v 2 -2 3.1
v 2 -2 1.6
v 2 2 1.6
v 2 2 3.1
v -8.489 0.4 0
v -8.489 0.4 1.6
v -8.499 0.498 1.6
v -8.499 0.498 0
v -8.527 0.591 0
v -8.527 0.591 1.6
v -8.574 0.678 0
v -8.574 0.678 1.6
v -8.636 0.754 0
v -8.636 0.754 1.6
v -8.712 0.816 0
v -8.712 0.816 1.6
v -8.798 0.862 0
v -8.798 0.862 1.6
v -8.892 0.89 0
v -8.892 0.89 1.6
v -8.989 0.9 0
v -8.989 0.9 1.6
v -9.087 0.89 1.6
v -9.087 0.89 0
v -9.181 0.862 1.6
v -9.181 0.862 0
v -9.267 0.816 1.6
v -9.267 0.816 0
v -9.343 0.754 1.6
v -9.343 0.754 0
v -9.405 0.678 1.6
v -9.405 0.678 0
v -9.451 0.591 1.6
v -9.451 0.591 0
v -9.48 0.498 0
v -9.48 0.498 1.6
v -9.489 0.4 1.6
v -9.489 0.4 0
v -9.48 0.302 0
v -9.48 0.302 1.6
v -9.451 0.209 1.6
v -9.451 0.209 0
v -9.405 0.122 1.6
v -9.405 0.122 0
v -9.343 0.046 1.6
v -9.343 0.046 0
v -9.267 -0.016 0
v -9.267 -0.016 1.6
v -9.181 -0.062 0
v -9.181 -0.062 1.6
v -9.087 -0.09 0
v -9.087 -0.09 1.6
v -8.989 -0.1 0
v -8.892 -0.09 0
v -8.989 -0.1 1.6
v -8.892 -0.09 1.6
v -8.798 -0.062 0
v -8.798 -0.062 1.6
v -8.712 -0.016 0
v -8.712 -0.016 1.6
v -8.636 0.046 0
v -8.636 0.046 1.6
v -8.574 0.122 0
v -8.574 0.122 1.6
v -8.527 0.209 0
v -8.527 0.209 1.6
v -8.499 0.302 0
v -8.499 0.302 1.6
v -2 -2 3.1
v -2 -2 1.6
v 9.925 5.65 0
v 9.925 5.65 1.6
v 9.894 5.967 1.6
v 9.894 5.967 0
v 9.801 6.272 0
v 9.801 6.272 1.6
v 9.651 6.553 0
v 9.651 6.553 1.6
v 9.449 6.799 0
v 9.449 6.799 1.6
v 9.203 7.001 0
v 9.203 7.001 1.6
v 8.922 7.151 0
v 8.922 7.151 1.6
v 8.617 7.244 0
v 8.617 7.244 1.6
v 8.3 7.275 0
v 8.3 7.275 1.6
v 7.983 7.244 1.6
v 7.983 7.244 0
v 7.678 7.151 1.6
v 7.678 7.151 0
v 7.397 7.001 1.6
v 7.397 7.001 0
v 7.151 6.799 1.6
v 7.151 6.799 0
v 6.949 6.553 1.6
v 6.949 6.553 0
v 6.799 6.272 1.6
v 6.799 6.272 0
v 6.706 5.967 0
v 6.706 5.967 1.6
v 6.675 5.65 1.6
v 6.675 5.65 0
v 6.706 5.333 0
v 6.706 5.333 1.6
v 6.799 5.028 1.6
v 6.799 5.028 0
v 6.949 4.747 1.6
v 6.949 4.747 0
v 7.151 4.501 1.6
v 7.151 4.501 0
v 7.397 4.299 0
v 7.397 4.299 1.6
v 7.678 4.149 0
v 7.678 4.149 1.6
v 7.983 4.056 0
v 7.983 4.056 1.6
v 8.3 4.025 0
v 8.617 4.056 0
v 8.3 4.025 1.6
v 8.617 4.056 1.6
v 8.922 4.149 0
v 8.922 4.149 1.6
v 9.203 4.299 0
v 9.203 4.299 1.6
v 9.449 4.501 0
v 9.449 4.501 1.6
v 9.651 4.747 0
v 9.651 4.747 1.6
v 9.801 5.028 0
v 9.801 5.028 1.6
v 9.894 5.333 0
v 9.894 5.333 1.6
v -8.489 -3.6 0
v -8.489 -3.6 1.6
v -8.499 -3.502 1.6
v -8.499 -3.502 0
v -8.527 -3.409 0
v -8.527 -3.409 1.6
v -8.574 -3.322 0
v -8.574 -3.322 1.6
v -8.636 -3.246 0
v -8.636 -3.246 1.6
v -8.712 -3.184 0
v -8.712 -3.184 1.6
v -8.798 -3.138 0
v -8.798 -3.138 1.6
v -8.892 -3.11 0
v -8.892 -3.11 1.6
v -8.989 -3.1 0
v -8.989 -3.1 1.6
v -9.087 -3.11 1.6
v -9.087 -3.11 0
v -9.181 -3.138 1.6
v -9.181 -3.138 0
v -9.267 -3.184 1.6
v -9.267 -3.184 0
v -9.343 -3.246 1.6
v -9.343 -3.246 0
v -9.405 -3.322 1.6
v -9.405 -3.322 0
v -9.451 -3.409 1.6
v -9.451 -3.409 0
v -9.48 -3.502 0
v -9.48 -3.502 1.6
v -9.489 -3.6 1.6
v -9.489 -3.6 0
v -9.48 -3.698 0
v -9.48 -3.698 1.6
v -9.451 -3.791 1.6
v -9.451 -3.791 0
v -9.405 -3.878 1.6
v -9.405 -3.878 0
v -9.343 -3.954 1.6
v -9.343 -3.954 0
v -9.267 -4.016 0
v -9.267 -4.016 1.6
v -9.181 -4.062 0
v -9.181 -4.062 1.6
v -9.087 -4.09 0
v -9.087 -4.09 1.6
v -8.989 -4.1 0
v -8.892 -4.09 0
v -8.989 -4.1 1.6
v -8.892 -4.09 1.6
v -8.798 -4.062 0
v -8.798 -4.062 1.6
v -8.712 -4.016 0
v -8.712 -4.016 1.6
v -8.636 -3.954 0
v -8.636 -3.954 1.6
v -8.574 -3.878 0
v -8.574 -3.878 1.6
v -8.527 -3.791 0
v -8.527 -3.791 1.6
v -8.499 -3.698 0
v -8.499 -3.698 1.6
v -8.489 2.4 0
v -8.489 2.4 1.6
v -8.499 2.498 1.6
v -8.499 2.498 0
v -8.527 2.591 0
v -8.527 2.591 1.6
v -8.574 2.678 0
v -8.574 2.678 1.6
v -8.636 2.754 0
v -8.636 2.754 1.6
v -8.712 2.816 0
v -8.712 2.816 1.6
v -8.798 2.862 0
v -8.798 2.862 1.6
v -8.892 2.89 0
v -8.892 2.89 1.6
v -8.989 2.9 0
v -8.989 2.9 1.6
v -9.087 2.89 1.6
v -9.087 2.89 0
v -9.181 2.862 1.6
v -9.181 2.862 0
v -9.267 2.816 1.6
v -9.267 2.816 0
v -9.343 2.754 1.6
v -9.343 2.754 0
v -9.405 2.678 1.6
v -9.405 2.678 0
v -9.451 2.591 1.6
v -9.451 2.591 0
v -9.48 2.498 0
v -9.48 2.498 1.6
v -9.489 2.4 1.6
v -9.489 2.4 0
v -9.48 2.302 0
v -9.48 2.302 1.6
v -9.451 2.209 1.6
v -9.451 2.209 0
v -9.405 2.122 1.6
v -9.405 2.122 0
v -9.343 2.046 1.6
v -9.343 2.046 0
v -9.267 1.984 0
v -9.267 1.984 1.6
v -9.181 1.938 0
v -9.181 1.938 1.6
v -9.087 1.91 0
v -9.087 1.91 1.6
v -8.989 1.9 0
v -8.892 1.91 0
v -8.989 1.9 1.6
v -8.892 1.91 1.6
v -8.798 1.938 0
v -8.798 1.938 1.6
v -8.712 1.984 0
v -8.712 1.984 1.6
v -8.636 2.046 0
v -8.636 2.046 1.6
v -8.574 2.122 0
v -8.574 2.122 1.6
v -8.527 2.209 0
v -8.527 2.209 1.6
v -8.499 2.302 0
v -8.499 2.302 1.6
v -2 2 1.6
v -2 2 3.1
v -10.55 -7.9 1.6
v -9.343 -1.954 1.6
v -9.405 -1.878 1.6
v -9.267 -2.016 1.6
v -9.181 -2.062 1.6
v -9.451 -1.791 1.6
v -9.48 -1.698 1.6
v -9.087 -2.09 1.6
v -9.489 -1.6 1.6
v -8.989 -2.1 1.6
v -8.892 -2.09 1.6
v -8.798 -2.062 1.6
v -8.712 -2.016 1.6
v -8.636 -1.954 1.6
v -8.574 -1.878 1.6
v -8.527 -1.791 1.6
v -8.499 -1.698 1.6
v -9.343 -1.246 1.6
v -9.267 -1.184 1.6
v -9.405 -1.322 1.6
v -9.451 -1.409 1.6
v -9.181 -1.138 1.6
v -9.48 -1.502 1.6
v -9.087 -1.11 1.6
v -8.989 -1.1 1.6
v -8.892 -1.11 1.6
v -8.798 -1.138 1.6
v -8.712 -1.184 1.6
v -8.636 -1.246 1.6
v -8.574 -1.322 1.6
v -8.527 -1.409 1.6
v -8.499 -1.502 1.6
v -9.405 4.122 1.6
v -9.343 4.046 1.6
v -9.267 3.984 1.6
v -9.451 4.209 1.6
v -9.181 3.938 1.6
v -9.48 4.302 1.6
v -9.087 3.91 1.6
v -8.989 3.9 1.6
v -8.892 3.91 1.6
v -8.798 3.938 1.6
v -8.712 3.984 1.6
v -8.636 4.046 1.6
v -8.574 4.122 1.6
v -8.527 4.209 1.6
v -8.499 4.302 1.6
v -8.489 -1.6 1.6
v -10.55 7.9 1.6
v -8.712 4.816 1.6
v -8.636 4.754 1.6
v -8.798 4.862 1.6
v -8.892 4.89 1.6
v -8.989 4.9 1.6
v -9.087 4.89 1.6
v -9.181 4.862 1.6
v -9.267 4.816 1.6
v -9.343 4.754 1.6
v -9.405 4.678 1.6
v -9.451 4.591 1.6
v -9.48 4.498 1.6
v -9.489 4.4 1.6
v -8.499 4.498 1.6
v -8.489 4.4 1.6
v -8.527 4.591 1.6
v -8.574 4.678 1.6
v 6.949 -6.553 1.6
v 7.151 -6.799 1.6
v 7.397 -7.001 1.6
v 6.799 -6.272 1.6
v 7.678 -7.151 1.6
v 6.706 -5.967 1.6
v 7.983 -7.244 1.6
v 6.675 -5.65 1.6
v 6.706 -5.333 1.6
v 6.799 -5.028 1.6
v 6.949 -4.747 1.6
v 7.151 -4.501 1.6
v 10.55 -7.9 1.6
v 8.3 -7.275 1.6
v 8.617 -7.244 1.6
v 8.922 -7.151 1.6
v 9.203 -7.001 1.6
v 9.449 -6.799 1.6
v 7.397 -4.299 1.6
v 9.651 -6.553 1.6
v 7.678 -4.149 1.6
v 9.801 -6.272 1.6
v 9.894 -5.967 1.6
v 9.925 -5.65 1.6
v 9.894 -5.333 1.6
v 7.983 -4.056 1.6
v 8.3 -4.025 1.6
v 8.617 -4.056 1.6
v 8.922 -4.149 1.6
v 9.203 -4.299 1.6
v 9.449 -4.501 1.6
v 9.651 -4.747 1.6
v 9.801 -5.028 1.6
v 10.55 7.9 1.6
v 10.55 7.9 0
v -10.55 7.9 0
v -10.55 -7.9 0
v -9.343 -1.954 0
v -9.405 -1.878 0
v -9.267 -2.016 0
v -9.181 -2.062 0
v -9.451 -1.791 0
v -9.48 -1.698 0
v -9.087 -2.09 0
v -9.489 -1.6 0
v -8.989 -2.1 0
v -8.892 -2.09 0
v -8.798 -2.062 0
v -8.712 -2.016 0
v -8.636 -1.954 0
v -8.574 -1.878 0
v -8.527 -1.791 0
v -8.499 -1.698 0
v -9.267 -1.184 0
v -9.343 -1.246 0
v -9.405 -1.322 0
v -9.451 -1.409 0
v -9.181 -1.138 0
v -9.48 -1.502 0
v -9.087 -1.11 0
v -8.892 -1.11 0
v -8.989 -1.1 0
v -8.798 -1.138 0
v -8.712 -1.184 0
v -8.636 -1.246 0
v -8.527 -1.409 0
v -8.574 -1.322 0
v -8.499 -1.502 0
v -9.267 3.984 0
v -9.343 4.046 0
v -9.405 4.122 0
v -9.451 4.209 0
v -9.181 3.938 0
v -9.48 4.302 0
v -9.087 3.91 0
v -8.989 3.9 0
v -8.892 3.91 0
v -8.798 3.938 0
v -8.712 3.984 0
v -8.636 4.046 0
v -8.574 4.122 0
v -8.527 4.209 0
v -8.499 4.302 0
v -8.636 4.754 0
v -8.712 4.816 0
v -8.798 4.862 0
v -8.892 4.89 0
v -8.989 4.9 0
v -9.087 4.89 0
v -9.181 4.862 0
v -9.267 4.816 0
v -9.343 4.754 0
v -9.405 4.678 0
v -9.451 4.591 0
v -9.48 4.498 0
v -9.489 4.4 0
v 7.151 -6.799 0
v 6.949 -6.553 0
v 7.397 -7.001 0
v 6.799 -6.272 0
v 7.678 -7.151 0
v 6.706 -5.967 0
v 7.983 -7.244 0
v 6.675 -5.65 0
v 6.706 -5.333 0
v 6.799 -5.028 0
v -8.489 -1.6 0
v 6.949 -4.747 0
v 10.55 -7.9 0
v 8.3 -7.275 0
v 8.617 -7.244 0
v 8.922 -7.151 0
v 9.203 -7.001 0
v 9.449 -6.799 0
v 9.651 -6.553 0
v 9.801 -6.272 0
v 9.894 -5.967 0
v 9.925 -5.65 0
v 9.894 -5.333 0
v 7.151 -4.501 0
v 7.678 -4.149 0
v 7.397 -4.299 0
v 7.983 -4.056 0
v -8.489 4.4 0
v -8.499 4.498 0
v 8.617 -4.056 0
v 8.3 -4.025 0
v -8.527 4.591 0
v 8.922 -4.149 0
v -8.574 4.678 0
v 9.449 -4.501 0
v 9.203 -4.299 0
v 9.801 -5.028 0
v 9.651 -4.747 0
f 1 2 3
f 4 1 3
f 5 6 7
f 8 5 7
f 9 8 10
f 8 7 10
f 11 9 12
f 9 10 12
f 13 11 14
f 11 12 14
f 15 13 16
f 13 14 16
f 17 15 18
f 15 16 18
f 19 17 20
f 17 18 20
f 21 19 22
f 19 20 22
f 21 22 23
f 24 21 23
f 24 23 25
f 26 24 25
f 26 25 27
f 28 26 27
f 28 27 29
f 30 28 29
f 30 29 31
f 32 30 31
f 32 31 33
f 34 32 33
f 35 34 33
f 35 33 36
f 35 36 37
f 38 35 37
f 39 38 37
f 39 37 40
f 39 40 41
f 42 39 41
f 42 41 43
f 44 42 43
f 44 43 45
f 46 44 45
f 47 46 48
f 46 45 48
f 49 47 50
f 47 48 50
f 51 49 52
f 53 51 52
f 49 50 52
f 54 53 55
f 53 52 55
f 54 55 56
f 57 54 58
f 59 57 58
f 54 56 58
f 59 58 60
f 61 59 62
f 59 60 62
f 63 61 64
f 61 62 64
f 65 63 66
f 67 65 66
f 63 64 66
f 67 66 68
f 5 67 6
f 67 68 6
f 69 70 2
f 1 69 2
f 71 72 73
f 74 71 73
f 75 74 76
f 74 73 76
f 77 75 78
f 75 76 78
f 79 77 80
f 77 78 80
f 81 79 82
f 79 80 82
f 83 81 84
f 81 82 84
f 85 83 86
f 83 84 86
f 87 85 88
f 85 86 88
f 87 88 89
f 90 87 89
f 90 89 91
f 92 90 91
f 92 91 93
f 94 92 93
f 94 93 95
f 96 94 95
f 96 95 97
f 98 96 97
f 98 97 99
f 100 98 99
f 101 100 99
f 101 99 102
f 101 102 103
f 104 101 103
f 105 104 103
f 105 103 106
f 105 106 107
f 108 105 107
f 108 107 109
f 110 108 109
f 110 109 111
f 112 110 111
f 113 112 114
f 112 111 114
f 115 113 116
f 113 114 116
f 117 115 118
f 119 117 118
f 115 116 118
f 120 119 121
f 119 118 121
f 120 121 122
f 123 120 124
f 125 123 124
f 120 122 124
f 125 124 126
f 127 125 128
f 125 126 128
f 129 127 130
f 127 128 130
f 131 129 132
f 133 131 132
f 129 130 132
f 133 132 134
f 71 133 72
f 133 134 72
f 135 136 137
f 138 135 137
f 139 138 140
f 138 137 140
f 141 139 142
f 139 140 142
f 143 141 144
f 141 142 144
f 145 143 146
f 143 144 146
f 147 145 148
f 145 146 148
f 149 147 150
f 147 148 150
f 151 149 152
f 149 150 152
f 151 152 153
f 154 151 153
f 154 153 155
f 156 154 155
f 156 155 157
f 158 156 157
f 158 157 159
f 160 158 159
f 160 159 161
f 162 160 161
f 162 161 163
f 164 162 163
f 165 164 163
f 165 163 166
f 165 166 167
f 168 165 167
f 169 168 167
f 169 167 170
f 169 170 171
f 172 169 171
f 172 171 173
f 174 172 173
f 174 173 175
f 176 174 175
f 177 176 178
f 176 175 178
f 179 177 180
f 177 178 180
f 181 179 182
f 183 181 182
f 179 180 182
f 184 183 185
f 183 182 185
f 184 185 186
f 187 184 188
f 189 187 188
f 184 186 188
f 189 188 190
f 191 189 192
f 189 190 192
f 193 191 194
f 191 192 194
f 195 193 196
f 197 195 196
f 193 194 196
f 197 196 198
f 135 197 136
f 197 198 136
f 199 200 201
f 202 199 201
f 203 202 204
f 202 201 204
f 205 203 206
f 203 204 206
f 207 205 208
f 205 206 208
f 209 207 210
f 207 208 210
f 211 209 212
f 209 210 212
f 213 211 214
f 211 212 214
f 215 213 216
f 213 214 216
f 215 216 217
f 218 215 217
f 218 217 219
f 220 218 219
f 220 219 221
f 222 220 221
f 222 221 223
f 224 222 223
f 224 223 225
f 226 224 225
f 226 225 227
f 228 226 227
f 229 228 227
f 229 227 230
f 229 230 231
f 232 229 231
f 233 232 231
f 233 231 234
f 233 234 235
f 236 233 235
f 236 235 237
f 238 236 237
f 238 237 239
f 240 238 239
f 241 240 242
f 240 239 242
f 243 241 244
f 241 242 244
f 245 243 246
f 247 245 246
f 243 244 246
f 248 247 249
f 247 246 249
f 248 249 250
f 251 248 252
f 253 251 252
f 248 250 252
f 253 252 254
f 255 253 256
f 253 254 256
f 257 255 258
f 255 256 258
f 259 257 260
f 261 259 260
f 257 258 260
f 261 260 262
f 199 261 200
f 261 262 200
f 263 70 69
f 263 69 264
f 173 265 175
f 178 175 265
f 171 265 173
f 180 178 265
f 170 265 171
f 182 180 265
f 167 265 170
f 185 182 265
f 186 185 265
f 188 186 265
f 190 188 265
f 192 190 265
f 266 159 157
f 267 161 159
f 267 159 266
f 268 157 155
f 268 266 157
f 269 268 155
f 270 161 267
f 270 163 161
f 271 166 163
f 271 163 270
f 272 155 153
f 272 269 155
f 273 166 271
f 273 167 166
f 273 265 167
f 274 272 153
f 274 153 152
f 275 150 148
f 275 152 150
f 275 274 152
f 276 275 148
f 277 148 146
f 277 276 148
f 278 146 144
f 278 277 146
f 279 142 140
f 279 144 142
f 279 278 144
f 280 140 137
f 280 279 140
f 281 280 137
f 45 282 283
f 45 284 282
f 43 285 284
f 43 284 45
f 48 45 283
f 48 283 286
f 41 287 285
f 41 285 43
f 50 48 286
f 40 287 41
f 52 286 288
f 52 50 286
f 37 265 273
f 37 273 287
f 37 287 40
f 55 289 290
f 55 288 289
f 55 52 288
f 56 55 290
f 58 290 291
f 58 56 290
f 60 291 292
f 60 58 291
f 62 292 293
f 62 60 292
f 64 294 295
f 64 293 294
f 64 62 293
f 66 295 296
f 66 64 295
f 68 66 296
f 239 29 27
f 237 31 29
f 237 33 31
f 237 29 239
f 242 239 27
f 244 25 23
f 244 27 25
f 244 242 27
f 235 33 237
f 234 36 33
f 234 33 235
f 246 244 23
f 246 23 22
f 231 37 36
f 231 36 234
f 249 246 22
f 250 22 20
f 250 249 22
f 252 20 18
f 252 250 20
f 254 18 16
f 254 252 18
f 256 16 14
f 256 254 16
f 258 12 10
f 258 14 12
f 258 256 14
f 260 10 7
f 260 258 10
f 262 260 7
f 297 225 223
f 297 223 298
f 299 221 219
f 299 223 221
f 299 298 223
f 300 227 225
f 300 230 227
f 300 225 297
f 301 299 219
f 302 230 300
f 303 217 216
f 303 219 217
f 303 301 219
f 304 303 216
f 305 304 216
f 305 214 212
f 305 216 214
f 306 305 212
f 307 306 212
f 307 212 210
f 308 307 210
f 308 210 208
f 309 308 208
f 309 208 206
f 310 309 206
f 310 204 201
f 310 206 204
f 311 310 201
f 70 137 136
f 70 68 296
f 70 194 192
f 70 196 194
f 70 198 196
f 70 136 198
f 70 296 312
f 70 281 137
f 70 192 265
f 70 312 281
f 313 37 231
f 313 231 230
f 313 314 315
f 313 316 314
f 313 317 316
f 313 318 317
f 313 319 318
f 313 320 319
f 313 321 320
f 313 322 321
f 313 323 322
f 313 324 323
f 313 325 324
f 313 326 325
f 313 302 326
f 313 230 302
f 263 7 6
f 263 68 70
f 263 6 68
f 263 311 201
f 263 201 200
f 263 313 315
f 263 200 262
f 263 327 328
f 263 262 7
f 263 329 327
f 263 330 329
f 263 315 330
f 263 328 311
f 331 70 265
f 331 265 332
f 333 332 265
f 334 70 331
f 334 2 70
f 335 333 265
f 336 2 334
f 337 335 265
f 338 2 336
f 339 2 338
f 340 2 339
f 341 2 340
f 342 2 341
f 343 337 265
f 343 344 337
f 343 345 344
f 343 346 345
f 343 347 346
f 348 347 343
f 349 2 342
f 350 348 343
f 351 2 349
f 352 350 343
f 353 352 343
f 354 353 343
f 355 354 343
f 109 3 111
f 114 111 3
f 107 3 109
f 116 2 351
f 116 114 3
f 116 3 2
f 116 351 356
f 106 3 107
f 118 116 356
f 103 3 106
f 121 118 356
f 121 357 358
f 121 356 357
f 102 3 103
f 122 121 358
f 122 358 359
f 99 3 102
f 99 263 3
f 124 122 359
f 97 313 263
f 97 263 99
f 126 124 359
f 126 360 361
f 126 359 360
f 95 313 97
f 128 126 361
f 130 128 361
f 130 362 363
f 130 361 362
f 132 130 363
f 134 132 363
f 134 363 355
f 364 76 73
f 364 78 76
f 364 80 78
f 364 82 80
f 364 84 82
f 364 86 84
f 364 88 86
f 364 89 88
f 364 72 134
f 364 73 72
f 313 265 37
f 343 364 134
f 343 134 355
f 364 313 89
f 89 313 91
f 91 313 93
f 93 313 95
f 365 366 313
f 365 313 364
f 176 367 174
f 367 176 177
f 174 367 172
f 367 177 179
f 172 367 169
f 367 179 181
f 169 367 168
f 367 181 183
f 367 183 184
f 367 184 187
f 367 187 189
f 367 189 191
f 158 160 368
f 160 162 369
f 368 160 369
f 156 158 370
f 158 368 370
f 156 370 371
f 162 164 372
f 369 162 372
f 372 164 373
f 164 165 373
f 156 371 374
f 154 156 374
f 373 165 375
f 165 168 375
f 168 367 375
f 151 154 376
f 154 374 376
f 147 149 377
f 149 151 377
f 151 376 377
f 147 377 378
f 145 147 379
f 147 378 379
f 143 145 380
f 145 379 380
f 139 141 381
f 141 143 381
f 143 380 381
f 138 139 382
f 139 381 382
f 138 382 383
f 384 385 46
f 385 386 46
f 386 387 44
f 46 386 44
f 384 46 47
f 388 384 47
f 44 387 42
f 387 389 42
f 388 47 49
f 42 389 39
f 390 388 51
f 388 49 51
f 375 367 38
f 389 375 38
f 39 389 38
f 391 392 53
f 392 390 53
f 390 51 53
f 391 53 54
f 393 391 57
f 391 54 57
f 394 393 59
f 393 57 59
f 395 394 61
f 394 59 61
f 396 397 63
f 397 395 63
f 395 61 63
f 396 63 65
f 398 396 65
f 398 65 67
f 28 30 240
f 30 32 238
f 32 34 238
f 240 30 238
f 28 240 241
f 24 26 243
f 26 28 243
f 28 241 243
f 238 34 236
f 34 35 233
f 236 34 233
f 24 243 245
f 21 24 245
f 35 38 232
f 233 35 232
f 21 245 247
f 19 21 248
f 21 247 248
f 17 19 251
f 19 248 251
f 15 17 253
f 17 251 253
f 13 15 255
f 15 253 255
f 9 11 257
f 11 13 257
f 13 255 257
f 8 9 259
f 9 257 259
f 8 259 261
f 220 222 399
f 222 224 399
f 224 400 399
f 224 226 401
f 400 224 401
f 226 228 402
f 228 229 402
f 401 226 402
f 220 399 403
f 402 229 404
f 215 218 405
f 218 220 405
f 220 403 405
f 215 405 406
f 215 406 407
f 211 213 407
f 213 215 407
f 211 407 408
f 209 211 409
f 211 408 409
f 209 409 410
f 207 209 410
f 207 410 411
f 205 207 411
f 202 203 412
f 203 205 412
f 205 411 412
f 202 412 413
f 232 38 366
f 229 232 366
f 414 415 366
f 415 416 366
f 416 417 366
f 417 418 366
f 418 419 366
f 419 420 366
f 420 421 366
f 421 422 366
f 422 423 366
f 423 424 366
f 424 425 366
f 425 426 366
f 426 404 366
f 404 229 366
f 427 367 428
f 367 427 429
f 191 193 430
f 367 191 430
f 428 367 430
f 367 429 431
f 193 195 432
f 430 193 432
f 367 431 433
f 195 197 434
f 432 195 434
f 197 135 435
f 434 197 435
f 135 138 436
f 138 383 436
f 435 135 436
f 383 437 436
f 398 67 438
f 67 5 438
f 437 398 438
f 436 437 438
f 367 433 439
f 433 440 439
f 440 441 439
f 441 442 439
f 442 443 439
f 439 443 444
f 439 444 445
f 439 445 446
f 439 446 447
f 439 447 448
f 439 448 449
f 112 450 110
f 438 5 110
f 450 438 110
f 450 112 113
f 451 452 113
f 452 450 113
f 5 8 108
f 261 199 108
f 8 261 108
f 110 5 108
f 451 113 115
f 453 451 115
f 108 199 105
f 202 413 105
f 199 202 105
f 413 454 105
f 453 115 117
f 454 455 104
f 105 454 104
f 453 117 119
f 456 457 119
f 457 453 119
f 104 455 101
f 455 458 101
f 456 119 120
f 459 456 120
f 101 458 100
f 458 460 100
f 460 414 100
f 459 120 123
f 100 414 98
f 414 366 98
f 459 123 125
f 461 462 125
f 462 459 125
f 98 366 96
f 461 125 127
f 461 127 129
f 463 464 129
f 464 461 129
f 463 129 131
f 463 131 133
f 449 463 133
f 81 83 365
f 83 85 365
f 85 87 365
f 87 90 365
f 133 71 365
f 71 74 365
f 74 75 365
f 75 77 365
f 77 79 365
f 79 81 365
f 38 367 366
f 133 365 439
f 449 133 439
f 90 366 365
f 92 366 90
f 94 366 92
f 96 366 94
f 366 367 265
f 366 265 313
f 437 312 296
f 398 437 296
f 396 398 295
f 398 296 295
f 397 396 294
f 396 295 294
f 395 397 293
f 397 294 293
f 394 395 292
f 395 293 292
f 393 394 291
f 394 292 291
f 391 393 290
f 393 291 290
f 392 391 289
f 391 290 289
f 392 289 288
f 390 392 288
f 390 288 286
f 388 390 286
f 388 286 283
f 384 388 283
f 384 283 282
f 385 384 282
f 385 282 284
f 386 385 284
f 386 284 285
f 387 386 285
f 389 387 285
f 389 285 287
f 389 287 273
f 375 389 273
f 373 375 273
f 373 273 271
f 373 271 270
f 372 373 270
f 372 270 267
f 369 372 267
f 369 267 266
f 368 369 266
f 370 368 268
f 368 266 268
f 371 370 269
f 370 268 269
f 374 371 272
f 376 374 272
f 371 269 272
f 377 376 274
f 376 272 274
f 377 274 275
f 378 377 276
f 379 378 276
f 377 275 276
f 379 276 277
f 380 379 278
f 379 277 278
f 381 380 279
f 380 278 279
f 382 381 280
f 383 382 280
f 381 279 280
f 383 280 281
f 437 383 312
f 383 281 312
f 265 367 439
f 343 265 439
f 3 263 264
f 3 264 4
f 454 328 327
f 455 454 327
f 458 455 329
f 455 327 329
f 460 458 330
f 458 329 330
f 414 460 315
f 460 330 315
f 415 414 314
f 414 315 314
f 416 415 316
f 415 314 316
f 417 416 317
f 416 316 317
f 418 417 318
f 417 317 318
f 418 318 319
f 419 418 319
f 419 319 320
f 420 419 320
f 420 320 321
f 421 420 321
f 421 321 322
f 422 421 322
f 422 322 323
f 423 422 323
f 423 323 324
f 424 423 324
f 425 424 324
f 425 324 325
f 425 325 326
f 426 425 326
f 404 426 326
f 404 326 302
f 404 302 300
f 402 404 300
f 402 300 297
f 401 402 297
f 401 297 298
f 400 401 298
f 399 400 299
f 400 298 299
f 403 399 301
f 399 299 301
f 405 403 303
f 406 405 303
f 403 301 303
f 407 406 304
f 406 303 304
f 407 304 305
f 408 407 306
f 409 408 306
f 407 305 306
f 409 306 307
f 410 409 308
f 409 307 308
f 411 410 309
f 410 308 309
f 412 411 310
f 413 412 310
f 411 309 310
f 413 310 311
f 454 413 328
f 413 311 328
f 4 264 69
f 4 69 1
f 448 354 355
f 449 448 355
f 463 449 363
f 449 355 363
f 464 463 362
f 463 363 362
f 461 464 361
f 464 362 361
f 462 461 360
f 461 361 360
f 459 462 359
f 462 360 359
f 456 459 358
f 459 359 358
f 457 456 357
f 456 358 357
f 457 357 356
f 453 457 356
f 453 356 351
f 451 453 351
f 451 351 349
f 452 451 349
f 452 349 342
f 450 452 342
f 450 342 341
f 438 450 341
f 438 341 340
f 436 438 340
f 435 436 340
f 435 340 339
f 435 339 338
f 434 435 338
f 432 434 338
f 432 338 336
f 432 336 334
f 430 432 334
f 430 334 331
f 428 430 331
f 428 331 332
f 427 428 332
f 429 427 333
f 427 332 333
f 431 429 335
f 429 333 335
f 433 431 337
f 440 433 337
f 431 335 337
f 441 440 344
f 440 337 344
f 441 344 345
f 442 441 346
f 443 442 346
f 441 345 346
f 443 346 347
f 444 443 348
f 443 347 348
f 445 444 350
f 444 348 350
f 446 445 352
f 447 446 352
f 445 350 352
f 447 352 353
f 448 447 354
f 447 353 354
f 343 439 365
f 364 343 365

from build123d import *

# Parameters (mm, degrees)
F0_W     = 21.1
F0_H     = 15.8
F1_DEPTH = 1.6
F2_R     = 1.625
F3_DEPTH = 25
F4_W     = 4
F4_H     = 4
F5_DEPTH = 1.5
F6_R     = 0.5
F7_DEPTH = 25


with BuildPart() as f1:
    # F0 (on Top) → F1 (new body)
    with BuildSketch(Plane.XY):
        Rectangle(F0_W, F0_H)
    extrude(amount=F1_DEPTH)

    # F2 (on face) → F3 (cut)
    with BuildSketch(Plane.XY.offset(1.6)):
        with Locations((8.3, 5.65)):
            Circle(F2_R)
        with Locations((8.3, -5.65)):
            Circle(F2_R)
    extrude(amount=-F3_DEPTH, mode=Mode.SUBTRACT)

    # F4 (on face) → F5 (join)
    with BuildSketch(Plane.XY.offset(1.6)):
        Rectangle(F4_W, F4_H)
    extrude(amount=F5_DEPTH)

    # F6 (on face) → F7 (cut)
    with BuildSketch(Plane.XY.offset(1.6)):
        with Locations((-8.989307, 4.4)):
            Circle(F6_R)
        with Locations((-8.989307, 2.4)):
            Circle(F6_R)
        with Locations((-8.989307, 0.4)):
            Circle(F6_R)
        with Locations((-8.989307, -1.6)):
            Circle(F6_R)
        with Locations((-8.989307, -3.6)):
            Circle(F6_R)
    extrude(amount=-F7_DEPTH, mode=Mode.SUBTRACT)


solid = f1.part
